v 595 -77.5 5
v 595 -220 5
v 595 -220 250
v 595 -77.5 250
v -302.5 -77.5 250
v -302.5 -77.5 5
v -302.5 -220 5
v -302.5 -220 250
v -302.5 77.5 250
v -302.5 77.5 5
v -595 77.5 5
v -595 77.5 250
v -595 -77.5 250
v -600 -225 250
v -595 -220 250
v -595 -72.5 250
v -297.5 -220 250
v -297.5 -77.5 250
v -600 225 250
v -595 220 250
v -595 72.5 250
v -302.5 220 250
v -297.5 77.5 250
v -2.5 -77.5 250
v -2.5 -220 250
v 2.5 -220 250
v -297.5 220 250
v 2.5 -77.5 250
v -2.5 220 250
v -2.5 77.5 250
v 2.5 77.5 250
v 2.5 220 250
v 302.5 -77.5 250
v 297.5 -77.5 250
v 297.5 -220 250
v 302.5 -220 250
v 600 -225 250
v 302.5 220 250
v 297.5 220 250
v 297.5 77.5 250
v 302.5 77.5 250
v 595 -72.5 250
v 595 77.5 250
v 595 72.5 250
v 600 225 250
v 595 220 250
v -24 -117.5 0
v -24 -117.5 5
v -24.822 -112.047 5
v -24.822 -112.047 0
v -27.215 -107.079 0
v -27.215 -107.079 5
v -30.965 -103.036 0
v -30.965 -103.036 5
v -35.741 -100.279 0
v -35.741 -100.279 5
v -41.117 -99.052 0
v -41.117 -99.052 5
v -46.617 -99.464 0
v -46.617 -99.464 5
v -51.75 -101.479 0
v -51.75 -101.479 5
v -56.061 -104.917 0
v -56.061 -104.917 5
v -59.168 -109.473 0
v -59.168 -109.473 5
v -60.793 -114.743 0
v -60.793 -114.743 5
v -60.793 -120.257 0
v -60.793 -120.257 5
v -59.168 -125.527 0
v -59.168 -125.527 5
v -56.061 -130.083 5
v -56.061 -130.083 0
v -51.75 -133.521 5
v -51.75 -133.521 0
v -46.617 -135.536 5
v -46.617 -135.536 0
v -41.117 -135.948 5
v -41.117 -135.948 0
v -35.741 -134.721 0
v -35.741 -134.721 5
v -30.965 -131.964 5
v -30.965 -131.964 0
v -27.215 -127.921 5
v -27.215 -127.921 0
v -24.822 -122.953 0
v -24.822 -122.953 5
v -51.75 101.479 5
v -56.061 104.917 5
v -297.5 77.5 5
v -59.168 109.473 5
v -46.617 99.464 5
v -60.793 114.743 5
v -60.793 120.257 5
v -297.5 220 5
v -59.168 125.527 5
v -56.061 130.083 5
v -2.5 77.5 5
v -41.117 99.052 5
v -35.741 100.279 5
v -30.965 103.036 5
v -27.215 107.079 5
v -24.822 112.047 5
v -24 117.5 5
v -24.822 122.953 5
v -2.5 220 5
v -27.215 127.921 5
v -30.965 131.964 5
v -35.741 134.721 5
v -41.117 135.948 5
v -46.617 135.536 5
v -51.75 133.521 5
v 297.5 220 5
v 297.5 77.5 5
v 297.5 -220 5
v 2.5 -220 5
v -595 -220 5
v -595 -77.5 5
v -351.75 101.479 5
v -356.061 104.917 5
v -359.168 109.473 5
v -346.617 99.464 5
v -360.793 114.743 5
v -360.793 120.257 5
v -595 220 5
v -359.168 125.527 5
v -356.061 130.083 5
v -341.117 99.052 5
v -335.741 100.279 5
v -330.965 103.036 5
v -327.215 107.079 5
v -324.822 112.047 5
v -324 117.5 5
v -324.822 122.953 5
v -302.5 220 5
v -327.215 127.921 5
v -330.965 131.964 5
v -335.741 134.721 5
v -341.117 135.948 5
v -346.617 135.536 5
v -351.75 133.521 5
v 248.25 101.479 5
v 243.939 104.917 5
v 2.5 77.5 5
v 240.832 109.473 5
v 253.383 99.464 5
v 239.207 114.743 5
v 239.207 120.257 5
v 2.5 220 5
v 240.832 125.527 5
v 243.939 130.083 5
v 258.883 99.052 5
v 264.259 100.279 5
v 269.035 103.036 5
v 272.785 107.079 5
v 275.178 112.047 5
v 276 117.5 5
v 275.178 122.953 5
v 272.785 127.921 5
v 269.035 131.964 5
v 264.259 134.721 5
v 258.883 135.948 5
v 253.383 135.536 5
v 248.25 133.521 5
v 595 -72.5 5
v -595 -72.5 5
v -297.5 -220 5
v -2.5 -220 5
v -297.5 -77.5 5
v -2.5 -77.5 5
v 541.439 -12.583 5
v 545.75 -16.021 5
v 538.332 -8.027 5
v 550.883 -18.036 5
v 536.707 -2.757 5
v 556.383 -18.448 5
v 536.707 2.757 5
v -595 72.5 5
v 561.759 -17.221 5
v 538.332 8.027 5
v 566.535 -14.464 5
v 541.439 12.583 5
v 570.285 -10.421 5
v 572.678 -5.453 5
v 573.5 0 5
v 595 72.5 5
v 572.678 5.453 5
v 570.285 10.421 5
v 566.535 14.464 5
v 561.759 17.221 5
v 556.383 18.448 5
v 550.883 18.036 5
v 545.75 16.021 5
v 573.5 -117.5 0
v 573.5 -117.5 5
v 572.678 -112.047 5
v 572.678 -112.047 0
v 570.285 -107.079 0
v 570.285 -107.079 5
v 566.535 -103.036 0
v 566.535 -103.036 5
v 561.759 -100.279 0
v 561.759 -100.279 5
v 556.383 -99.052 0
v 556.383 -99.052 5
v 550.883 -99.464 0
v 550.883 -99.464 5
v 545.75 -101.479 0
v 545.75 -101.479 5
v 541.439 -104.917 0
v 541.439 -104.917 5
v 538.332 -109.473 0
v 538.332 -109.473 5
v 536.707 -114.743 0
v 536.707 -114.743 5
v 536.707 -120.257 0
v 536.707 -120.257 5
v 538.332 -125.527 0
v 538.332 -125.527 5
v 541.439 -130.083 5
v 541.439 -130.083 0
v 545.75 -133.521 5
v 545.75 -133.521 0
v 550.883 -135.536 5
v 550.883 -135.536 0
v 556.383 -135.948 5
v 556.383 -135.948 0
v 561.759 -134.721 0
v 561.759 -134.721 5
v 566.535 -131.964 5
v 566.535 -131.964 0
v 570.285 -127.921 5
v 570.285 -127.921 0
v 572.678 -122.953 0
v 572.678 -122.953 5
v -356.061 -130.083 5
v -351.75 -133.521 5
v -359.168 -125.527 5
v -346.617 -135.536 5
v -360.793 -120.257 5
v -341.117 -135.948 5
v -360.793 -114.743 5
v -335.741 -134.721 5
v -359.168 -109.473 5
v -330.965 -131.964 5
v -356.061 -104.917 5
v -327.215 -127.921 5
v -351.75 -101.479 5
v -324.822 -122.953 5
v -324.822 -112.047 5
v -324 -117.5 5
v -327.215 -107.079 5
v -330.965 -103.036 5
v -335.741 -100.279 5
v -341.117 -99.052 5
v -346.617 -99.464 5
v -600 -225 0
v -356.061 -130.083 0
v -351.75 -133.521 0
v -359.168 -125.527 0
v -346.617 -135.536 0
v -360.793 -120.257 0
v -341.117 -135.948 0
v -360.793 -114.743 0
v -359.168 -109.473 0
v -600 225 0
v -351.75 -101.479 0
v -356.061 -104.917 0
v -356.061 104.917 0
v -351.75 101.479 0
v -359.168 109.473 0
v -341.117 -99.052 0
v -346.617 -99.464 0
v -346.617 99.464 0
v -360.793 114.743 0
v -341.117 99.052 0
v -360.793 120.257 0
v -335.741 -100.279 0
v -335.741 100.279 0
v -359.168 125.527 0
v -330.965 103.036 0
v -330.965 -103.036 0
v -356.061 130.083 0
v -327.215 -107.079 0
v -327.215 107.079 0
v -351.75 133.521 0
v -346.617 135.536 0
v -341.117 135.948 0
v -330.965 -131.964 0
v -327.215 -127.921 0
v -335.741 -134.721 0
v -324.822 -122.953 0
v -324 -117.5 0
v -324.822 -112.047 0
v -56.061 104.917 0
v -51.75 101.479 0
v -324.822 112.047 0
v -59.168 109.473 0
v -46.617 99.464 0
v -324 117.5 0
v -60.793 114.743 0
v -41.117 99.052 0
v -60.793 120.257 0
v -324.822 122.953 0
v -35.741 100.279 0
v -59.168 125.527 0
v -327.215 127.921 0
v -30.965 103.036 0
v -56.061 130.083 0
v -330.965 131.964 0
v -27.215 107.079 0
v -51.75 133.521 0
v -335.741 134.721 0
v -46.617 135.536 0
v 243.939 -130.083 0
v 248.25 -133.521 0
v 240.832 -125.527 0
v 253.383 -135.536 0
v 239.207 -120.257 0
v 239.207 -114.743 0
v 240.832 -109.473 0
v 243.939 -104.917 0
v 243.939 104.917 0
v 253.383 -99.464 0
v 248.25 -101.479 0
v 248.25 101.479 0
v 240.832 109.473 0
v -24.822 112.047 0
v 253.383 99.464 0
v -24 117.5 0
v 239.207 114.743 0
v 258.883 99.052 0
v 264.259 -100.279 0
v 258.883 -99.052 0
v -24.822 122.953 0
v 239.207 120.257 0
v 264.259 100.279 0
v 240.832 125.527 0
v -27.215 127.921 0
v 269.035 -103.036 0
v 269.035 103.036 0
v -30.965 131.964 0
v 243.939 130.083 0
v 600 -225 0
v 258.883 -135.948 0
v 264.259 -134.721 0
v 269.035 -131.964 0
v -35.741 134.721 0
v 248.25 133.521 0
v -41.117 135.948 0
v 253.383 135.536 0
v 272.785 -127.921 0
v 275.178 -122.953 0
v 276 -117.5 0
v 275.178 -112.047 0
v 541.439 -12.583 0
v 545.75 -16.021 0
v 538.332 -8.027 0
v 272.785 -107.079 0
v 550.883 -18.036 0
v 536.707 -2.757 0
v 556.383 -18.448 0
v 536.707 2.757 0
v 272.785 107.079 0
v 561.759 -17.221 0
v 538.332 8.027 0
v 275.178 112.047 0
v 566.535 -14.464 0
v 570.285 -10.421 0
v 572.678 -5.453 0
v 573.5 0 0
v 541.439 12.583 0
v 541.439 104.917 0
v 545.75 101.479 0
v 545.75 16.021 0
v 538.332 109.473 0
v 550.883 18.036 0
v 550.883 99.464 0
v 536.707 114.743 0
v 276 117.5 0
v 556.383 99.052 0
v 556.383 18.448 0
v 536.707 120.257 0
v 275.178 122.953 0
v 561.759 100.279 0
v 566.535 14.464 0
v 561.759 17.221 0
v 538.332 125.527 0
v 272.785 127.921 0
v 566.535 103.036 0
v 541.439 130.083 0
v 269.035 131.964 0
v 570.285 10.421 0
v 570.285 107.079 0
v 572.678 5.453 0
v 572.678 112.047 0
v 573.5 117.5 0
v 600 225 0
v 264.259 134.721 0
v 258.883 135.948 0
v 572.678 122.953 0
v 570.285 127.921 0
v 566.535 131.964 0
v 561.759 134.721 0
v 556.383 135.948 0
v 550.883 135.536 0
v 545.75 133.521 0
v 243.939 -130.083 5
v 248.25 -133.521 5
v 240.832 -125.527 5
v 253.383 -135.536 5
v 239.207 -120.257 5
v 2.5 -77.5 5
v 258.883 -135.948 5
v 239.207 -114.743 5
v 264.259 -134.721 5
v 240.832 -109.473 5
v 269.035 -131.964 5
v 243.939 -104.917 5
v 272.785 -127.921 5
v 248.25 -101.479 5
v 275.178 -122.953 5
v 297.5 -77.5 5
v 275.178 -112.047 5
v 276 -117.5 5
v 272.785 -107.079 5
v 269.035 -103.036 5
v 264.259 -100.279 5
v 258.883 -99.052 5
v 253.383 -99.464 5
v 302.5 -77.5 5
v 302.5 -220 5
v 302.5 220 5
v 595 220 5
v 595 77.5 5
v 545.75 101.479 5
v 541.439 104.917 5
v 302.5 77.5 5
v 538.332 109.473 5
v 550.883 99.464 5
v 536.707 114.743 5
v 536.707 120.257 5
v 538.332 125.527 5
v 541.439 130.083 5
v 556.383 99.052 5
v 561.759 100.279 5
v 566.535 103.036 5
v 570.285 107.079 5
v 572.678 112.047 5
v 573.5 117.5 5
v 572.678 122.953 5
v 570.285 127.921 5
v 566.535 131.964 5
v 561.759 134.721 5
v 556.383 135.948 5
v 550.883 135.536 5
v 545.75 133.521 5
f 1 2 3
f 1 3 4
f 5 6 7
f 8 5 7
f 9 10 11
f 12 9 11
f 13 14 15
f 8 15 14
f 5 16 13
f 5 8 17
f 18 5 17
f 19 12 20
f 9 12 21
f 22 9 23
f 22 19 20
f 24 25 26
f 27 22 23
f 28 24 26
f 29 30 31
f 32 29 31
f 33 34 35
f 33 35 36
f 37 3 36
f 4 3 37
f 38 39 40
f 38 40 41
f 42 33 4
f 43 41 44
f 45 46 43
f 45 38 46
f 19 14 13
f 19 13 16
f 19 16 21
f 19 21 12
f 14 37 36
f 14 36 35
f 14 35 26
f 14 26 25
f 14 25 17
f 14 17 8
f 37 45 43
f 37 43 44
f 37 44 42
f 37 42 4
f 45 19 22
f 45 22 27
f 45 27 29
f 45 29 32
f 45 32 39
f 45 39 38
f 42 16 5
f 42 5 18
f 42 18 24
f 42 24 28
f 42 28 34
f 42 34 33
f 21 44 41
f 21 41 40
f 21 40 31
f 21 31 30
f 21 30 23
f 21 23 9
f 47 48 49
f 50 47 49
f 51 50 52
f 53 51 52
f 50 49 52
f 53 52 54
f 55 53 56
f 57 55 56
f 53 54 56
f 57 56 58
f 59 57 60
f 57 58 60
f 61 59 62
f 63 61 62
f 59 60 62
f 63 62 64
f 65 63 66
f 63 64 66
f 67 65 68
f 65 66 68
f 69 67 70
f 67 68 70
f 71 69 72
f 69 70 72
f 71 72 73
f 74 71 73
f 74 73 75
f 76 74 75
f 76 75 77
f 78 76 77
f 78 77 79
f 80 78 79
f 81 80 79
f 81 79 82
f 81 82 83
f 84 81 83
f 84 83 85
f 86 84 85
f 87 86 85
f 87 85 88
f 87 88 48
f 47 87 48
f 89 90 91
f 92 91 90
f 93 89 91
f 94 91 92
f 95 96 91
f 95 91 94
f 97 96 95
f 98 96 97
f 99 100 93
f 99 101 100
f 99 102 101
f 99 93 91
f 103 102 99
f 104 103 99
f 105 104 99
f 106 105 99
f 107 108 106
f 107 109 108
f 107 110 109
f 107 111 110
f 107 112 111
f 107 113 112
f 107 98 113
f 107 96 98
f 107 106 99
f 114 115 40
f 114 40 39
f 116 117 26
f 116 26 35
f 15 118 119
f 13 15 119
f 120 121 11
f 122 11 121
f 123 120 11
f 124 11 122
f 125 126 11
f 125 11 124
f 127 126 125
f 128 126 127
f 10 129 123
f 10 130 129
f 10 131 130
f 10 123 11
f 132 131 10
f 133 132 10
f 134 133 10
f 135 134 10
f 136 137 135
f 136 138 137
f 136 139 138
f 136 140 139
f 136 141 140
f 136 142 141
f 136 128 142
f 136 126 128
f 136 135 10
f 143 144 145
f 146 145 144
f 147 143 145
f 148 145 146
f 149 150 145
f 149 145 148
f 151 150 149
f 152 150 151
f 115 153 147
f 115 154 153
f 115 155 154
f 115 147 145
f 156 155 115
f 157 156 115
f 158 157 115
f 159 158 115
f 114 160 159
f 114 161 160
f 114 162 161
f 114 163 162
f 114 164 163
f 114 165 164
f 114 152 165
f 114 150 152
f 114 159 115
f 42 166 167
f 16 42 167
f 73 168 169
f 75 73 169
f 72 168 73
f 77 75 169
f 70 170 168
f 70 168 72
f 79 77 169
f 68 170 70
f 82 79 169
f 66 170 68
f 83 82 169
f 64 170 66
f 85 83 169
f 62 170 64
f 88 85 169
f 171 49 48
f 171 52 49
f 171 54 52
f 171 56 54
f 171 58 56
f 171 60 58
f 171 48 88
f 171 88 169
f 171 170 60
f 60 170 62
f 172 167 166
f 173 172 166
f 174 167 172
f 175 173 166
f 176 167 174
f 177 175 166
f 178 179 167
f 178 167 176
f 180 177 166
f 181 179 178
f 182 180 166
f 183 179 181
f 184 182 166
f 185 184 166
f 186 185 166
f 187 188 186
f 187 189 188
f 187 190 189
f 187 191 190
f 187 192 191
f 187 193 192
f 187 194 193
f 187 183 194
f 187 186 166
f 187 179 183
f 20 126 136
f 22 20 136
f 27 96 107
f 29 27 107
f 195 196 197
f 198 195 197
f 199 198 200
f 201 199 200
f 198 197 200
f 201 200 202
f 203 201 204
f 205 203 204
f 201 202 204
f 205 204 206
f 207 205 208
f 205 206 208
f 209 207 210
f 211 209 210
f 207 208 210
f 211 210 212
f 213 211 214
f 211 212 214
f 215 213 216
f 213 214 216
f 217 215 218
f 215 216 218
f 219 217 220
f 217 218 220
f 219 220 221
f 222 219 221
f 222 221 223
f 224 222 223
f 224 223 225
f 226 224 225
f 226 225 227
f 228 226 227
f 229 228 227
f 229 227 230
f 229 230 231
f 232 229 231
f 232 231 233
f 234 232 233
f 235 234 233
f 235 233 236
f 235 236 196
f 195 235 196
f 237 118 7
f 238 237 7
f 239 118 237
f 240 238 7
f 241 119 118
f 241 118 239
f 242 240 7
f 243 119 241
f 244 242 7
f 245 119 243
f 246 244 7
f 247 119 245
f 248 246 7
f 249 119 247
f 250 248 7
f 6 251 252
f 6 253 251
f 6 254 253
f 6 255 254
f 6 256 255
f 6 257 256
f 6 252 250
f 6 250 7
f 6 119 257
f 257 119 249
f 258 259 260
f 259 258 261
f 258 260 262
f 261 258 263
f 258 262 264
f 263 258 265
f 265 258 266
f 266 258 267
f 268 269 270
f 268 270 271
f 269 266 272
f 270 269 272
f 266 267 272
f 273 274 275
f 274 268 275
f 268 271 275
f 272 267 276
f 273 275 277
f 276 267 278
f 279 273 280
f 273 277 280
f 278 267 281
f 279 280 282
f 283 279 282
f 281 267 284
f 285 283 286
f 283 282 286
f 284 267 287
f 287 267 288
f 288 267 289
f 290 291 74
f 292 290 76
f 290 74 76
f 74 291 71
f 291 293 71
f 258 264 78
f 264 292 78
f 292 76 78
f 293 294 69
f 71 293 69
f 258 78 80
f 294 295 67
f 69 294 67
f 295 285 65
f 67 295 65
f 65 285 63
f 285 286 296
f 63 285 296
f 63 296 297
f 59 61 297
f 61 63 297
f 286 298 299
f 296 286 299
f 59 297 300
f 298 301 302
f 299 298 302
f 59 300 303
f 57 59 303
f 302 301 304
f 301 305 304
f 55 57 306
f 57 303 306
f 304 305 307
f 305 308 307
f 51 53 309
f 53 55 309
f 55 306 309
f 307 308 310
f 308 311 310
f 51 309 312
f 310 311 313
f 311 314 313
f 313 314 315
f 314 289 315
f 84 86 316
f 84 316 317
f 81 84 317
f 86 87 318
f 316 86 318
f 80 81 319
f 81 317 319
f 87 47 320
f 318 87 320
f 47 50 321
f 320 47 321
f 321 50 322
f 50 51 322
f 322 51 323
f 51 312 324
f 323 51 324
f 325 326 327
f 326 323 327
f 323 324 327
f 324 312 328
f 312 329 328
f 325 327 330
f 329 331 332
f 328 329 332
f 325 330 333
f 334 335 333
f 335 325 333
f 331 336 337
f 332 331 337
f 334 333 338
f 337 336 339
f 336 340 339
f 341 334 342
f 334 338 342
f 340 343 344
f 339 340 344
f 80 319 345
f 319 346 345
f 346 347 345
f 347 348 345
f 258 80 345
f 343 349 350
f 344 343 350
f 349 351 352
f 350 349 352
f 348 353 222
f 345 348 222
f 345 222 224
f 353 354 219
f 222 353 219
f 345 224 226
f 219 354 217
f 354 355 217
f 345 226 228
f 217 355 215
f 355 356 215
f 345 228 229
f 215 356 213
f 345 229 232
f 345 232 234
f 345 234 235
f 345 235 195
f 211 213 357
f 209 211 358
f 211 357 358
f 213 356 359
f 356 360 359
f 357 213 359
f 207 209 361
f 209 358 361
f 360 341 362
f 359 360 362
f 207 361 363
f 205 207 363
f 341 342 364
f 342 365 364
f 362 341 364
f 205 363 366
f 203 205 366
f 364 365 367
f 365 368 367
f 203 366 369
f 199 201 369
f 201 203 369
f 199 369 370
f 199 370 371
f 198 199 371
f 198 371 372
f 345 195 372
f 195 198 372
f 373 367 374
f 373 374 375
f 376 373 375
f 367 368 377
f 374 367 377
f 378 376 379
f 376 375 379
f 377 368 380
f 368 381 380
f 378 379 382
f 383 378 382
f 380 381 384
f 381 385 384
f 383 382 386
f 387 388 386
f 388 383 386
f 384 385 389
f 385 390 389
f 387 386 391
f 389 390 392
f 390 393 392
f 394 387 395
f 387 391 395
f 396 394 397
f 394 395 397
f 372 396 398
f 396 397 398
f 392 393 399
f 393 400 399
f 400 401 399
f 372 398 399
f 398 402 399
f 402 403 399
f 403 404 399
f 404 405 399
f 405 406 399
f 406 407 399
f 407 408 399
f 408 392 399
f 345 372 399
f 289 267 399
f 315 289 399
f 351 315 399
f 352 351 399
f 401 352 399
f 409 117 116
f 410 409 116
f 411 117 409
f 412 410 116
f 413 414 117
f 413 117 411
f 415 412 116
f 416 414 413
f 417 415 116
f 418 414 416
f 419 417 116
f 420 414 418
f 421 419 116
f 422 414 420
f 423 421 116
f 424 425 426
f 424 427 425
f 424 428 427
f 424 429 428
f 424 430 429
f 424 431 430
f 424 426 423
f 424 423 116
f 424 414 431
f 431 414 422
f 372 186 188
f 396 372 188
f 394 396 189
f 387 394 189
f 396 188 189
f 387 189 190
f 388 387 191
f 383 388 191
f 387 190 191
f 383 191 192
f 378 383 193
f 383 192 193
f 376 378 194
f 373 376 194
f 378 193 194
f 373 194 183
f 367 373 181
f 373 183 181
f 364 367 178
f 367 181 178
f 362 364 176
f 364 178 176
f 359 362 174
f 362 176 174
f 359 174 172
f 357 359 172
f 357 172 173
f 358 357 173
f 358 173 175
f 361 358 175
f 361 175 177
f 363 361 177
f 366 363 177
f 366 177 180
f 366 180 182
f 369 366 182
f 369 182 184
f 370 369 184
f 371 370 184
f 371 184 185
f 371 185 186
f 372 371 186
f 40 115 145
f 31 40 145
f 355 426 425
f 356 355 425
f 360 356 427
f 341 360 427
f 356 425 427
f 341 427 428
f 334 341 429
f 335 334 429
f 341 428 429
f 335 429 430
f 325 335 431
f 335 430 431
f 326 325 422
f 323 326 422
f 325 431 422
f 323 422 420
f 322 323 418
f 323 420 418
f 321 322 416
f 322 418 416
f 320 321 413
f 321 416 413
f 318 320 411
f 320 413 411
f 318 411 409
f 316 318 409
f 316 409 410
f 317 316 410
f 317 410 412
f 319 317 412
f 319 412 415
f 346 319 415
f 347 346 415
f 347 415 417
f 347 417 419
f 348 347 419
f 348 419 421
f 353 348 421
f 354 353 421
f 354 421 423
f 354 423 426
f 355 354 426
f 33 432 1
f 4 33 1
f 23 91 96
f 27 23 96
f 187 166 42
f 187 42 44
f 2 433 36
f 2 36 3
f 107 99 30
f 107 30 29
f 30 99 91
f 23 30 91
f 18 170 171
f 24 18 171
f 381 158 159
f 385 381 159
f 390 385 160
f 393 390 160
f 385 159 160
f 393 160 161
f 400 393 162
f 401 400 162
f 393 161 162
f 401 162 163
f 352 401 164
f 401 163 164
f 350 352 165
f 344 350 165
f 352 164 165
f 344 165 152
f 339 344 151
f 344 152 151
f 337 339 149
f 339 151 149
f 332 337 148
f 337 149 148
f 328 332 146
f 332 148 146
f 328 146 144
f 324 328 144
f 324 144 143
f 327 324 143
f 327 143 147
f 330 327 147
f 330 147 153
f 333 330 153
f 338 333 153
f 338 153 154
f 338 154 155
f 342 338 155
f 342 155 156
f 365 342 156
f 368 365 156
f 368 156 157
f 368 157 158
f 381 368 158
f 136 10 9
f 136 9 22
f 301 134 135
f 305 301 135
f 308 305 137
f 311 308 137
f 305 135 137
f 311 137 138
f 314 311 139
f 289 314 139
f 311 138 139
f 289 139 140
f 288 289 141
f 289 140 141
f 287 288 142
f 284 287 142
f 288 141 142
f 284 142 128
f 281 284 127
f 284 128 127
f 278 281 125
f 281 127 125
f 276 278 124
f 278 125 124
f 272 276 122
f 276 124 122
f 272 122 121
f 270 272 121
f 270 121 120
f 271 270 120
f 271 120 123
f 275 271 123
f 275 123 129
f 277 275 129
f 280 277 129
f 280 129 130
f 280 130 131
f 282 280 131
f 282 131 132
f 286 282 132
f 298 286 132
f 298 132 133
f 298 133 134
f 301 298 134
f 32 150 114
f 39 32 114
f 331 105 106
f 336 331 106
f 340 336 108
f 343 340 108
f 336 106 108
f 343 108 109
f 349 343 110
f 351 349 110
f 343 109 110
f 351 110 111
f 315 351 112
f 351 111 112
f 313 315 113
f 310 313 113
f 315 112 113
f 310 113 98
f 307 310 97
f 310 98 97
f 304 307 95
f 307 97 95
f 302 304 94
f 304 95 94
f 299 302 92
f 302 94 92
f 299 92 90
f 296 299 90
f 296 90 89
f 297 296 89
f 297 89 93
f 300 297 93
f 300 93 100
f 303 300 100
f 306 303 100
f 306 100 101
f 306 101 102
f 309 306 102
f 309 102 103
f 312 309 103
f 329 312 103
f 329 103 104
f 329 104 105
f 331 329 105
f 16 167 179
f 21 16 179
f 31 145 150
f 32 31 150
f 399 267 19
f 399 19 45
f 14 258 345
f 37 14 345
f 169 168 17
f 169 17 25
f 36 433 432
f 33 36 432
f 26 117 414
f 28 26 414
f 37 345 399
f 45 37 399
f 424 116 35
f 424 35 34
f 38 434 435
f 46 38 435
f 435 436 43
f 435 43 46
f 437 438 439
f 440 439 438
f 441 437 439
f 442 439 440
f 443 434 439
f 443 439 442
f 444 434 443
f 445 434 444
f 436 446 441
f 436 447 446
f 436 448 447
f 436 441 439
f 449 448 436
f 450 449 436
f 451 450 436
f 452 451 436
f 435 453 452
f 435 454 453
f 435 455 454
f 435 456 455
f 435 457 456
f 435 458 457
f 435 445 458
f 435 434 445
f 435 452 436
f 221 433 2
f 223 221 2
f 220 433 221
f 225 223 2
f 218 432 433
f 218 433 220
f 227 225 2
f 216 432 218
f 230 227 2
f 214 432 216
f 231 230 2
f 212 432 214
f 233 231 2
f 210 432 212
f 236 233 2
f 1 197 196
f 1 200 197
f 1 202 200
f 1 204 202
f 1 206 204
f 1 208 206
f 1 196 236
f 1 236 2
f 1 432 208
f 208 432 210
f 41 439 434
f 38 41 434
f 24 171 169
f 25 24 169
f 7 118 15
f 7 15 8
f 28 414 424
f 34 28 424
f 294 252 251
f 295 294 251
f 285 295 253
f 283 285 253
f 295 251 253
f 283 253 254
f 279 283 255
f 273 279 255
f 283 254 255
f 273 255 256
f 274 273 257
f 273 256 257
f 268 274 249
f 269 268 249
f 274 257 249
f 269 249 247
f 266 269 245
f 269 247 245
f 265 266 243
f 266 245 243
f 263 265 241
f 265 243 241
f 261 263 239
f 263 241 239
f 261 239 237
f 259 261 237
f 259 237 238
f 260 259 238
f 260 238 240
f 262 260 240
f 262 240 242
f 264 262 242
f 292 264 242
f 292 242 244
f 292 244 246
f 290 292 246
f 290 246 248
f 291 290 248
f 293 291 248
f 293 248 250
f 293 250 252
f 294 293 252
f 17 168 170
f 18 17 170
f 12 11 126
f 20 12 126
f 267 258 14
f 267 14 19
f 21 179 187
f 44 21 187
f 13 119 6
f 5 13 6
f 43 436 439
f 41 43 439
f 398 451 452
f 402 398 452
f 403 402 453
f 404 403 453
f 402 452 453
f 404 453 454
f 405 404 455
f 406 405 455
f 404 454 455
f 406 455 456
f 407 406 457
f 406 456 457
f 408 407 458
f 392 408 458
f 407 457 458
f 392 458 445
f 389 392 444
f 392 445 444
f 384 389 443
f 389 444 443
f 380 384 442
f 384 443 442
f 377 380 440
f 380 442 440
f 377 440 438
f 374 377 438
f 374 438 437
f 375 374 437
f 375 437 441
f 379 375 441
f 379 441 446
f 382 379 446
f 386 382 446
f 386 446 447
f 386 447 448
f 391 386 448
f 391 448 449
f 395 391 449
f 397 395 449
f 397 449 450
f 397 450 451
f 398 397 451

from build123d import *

# Parameters (mm, degrees)
F0_W     = 1200
F0_H     = 450
F1_DEPTH = 250
F2_T     = -5
F3_W     = 5
F3_H     = 142.5
F3_H_2   = 5
F4_DEPTH = 245
F5_R     = 18.5
F6_DEPTH = 25


with BuildPart() as f1:
    # F0 (on Top) → F1 (new body)
    with BuildSketch(Plane.XY):
        Rectangle(F0_W, F0_H)
    extrude(amount=F1_DEPTH)

    # F2
    f2_openings = [f1.faces().sort_by_distance(p)[0] for p in [
        (0, 0, 250),
    ]]
    offset(amount=F2_T, openings=f2_openings)

    # F3 (on face) → F4 (join, through all)
    with BuildSketch(Plane.XY.offset(5)):
        Polygon((302.5, -77.5), (595, -77.5), (595, -72.5), (2.5, -72.5), (-595, -72.5), (-595, -75), (-595, -77.5), (-302.5, -77.5), (-297.5, -77.5), (-2.5, -77.5), (2.5, -77.5), (297.5, -77.5), align=None)
        with Locations((300, -148.75)):
            Rectangle(F3_W, F3_H)
        Polygon((2.5, 72.5), (595, 72.5), (595, 77.5), (302.5, 77.5), (297.5, 77.5), (2.5, 77.5), align=None)
        Polygon((0, -220), (2.5, -220), (2.5, -77.5), (-2.5, -77.5), (-2.5, -220), align=None)
        with Locations((0, 75)):
            Rectangle(F3_W, F3_H_2)
        with Locations((300, 148.75)):
            Rectangle(F3_W, F3_H)
        Polygon((-595, 72.5), (-2.5, 72.5), (-2.5, 77.5), (-297.5, 77.5), (-302.5, 77.5), (-595, 77.5), (-595, 75), align=None)
        with Locations((0, 148.75)):
            Rectangle(F3_W, F3_H)
        Polygon((-297.5, -220), (-297.5, -77.5), (-302.5, -77.5), (-302.5, -220), (-300, -220), align=None)
        with Locations((-300, 148.75)):
            Rectangle(F3_W, F3_H)
    extrude(amount=F4_DEPTH)

    # F5 (on face) → F6 (cut)
    with BuildSketch(Plane.XY.offset(5)):
        with Locations((-42.5, 117.5)):
            Circle(F5_R)
        with Locations((-342.5, 117.5)):
            Circle(F5_R)
        with Locations((-342.5, -117.5)):
            Circle(F5_R)
        with Locations((-42.5, -117.5)):
            Circle(F5_R)
        with Locations((257.5, -117.5)):
            Circle(F5_R)
        with Locations((257.5, 117.5)):
            Circle(F5_R)
        with Locations((555, 117.5)):
            Circle(F5_R)
        with Locations((555, 0)):
            Circle(F5_R)
        with Locations((555, -117.5)):
            Circle(F5_R)
    extrude(amount=-F6_DEPTH, mode=Mode.SUBTRACT)


solid = f1.part
